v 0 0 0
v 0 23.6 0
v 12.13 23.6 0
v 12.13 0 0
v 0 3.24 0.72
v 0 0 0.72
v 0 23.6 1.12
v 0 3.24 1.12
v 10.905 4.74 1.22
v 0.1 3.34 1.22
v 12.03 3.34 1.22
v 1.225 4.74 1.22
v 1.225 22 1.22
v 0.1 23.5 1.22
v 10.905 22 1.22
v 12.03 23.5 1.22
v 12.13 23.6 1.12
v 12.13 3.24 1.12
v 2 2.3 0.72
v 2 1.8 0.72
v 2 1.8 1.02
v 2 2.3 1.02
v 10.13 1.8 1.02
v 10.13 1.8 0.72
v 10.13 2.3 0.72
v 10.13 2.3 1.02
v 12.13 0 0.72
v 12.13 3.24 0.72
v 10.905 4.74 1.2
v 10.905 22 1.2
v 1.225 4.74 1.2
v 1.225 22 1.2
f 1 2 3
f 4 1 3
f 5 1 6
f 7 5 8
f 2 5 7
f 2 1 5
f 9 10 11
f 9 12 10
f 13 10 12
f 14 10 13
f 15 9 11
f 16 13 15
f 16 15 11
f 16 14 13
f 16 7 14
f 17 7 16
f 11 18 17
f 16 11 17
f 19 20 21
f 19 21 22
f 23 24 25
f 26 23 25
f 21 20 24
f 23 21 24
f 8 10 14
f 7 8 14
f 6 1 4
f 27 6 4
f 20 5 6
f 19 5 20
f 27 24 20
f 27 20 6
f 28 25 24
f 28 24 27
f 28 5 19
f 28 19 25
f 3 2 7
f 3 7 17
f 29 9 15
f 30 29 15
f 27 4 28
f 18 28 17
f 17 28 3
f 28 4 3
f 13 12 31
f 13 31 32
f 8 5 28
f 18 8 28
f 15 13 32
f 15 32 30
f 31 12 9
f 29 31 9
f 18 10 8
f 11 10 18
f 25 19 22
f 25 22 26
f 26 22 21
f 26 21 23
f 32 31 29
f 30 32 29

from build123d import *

# Parameters (mm, degrees)
SKETCH_W     = 12.13
SKETCH_H     = 23.6
PAD_DEPTH    = 0.72
SKETCH001_W  = 12.13
SKETCH001_H  = 20.36
PAD001_DEPTH = 0.5
SKETCH002_W  = 8.13
SKETCH002_H  = 0.5
PAD002_DEPTH = 0.3
SKETCH003_W  = 9.68
SKETCH003_H  = 17.26
POCKET_DEPTH = 0.02
CHAMFER_SIZE = 0.1


with BuildPart() as part:
    # Sketch → Pad (new body)
    with BuildSketch(Plane.XY):
        with Locations((6.065, 11.8)):
            Rectangle(SKETCH_W, SKETCH_H)
    extrude(amount=PAD_DEPTH)

    # Sketch001 (on Face6 of Pad) → Pad001 (join)
    with BuildSketch(Plane.XY.offset(0.72)):
        with Locations((6.065, 13.42)):
            Rectangle(SKETCH001_W, SKETCH001_H)
    extrude(amount=PAD001_DEPTH)

    # Sketch002 (on Face5 of Pad001) → Pad002 (join)
    with BuildSketch(Plane.XY.offset(0.72)):
        with Locations((6.065, 2.05)):
            Rectangle(SKETCH002_W, SKETCH002_H)
    extrude(amount=PAD002_DEPTH)

    # Sketch003 (on Face15 of Pad002) → Pocket (cut)
    with BuildSketch(Plane.XY.offset(1.22)):
        with Locations((6.065, 13.37)):
            Rectangle(SKETCH003_W, SKETCH003_H)
    extrude(amount=-POCKET_DEPTH, mode=Mode.SUBTRACT)

    # Chamfer
    chamfer_edges = [part.edges().sort_by_distance(p)[0] for p in [
        (6.065, 23.6, 1.22),
        (0, 13.42, 1.22),
        (6.065, 3.24, 1.22),
        (12.13, 13.42, 1.22),
    ]]
    chamfer(chamfer_edges, length=CHAMFER_SIZE)


solid = part.part
